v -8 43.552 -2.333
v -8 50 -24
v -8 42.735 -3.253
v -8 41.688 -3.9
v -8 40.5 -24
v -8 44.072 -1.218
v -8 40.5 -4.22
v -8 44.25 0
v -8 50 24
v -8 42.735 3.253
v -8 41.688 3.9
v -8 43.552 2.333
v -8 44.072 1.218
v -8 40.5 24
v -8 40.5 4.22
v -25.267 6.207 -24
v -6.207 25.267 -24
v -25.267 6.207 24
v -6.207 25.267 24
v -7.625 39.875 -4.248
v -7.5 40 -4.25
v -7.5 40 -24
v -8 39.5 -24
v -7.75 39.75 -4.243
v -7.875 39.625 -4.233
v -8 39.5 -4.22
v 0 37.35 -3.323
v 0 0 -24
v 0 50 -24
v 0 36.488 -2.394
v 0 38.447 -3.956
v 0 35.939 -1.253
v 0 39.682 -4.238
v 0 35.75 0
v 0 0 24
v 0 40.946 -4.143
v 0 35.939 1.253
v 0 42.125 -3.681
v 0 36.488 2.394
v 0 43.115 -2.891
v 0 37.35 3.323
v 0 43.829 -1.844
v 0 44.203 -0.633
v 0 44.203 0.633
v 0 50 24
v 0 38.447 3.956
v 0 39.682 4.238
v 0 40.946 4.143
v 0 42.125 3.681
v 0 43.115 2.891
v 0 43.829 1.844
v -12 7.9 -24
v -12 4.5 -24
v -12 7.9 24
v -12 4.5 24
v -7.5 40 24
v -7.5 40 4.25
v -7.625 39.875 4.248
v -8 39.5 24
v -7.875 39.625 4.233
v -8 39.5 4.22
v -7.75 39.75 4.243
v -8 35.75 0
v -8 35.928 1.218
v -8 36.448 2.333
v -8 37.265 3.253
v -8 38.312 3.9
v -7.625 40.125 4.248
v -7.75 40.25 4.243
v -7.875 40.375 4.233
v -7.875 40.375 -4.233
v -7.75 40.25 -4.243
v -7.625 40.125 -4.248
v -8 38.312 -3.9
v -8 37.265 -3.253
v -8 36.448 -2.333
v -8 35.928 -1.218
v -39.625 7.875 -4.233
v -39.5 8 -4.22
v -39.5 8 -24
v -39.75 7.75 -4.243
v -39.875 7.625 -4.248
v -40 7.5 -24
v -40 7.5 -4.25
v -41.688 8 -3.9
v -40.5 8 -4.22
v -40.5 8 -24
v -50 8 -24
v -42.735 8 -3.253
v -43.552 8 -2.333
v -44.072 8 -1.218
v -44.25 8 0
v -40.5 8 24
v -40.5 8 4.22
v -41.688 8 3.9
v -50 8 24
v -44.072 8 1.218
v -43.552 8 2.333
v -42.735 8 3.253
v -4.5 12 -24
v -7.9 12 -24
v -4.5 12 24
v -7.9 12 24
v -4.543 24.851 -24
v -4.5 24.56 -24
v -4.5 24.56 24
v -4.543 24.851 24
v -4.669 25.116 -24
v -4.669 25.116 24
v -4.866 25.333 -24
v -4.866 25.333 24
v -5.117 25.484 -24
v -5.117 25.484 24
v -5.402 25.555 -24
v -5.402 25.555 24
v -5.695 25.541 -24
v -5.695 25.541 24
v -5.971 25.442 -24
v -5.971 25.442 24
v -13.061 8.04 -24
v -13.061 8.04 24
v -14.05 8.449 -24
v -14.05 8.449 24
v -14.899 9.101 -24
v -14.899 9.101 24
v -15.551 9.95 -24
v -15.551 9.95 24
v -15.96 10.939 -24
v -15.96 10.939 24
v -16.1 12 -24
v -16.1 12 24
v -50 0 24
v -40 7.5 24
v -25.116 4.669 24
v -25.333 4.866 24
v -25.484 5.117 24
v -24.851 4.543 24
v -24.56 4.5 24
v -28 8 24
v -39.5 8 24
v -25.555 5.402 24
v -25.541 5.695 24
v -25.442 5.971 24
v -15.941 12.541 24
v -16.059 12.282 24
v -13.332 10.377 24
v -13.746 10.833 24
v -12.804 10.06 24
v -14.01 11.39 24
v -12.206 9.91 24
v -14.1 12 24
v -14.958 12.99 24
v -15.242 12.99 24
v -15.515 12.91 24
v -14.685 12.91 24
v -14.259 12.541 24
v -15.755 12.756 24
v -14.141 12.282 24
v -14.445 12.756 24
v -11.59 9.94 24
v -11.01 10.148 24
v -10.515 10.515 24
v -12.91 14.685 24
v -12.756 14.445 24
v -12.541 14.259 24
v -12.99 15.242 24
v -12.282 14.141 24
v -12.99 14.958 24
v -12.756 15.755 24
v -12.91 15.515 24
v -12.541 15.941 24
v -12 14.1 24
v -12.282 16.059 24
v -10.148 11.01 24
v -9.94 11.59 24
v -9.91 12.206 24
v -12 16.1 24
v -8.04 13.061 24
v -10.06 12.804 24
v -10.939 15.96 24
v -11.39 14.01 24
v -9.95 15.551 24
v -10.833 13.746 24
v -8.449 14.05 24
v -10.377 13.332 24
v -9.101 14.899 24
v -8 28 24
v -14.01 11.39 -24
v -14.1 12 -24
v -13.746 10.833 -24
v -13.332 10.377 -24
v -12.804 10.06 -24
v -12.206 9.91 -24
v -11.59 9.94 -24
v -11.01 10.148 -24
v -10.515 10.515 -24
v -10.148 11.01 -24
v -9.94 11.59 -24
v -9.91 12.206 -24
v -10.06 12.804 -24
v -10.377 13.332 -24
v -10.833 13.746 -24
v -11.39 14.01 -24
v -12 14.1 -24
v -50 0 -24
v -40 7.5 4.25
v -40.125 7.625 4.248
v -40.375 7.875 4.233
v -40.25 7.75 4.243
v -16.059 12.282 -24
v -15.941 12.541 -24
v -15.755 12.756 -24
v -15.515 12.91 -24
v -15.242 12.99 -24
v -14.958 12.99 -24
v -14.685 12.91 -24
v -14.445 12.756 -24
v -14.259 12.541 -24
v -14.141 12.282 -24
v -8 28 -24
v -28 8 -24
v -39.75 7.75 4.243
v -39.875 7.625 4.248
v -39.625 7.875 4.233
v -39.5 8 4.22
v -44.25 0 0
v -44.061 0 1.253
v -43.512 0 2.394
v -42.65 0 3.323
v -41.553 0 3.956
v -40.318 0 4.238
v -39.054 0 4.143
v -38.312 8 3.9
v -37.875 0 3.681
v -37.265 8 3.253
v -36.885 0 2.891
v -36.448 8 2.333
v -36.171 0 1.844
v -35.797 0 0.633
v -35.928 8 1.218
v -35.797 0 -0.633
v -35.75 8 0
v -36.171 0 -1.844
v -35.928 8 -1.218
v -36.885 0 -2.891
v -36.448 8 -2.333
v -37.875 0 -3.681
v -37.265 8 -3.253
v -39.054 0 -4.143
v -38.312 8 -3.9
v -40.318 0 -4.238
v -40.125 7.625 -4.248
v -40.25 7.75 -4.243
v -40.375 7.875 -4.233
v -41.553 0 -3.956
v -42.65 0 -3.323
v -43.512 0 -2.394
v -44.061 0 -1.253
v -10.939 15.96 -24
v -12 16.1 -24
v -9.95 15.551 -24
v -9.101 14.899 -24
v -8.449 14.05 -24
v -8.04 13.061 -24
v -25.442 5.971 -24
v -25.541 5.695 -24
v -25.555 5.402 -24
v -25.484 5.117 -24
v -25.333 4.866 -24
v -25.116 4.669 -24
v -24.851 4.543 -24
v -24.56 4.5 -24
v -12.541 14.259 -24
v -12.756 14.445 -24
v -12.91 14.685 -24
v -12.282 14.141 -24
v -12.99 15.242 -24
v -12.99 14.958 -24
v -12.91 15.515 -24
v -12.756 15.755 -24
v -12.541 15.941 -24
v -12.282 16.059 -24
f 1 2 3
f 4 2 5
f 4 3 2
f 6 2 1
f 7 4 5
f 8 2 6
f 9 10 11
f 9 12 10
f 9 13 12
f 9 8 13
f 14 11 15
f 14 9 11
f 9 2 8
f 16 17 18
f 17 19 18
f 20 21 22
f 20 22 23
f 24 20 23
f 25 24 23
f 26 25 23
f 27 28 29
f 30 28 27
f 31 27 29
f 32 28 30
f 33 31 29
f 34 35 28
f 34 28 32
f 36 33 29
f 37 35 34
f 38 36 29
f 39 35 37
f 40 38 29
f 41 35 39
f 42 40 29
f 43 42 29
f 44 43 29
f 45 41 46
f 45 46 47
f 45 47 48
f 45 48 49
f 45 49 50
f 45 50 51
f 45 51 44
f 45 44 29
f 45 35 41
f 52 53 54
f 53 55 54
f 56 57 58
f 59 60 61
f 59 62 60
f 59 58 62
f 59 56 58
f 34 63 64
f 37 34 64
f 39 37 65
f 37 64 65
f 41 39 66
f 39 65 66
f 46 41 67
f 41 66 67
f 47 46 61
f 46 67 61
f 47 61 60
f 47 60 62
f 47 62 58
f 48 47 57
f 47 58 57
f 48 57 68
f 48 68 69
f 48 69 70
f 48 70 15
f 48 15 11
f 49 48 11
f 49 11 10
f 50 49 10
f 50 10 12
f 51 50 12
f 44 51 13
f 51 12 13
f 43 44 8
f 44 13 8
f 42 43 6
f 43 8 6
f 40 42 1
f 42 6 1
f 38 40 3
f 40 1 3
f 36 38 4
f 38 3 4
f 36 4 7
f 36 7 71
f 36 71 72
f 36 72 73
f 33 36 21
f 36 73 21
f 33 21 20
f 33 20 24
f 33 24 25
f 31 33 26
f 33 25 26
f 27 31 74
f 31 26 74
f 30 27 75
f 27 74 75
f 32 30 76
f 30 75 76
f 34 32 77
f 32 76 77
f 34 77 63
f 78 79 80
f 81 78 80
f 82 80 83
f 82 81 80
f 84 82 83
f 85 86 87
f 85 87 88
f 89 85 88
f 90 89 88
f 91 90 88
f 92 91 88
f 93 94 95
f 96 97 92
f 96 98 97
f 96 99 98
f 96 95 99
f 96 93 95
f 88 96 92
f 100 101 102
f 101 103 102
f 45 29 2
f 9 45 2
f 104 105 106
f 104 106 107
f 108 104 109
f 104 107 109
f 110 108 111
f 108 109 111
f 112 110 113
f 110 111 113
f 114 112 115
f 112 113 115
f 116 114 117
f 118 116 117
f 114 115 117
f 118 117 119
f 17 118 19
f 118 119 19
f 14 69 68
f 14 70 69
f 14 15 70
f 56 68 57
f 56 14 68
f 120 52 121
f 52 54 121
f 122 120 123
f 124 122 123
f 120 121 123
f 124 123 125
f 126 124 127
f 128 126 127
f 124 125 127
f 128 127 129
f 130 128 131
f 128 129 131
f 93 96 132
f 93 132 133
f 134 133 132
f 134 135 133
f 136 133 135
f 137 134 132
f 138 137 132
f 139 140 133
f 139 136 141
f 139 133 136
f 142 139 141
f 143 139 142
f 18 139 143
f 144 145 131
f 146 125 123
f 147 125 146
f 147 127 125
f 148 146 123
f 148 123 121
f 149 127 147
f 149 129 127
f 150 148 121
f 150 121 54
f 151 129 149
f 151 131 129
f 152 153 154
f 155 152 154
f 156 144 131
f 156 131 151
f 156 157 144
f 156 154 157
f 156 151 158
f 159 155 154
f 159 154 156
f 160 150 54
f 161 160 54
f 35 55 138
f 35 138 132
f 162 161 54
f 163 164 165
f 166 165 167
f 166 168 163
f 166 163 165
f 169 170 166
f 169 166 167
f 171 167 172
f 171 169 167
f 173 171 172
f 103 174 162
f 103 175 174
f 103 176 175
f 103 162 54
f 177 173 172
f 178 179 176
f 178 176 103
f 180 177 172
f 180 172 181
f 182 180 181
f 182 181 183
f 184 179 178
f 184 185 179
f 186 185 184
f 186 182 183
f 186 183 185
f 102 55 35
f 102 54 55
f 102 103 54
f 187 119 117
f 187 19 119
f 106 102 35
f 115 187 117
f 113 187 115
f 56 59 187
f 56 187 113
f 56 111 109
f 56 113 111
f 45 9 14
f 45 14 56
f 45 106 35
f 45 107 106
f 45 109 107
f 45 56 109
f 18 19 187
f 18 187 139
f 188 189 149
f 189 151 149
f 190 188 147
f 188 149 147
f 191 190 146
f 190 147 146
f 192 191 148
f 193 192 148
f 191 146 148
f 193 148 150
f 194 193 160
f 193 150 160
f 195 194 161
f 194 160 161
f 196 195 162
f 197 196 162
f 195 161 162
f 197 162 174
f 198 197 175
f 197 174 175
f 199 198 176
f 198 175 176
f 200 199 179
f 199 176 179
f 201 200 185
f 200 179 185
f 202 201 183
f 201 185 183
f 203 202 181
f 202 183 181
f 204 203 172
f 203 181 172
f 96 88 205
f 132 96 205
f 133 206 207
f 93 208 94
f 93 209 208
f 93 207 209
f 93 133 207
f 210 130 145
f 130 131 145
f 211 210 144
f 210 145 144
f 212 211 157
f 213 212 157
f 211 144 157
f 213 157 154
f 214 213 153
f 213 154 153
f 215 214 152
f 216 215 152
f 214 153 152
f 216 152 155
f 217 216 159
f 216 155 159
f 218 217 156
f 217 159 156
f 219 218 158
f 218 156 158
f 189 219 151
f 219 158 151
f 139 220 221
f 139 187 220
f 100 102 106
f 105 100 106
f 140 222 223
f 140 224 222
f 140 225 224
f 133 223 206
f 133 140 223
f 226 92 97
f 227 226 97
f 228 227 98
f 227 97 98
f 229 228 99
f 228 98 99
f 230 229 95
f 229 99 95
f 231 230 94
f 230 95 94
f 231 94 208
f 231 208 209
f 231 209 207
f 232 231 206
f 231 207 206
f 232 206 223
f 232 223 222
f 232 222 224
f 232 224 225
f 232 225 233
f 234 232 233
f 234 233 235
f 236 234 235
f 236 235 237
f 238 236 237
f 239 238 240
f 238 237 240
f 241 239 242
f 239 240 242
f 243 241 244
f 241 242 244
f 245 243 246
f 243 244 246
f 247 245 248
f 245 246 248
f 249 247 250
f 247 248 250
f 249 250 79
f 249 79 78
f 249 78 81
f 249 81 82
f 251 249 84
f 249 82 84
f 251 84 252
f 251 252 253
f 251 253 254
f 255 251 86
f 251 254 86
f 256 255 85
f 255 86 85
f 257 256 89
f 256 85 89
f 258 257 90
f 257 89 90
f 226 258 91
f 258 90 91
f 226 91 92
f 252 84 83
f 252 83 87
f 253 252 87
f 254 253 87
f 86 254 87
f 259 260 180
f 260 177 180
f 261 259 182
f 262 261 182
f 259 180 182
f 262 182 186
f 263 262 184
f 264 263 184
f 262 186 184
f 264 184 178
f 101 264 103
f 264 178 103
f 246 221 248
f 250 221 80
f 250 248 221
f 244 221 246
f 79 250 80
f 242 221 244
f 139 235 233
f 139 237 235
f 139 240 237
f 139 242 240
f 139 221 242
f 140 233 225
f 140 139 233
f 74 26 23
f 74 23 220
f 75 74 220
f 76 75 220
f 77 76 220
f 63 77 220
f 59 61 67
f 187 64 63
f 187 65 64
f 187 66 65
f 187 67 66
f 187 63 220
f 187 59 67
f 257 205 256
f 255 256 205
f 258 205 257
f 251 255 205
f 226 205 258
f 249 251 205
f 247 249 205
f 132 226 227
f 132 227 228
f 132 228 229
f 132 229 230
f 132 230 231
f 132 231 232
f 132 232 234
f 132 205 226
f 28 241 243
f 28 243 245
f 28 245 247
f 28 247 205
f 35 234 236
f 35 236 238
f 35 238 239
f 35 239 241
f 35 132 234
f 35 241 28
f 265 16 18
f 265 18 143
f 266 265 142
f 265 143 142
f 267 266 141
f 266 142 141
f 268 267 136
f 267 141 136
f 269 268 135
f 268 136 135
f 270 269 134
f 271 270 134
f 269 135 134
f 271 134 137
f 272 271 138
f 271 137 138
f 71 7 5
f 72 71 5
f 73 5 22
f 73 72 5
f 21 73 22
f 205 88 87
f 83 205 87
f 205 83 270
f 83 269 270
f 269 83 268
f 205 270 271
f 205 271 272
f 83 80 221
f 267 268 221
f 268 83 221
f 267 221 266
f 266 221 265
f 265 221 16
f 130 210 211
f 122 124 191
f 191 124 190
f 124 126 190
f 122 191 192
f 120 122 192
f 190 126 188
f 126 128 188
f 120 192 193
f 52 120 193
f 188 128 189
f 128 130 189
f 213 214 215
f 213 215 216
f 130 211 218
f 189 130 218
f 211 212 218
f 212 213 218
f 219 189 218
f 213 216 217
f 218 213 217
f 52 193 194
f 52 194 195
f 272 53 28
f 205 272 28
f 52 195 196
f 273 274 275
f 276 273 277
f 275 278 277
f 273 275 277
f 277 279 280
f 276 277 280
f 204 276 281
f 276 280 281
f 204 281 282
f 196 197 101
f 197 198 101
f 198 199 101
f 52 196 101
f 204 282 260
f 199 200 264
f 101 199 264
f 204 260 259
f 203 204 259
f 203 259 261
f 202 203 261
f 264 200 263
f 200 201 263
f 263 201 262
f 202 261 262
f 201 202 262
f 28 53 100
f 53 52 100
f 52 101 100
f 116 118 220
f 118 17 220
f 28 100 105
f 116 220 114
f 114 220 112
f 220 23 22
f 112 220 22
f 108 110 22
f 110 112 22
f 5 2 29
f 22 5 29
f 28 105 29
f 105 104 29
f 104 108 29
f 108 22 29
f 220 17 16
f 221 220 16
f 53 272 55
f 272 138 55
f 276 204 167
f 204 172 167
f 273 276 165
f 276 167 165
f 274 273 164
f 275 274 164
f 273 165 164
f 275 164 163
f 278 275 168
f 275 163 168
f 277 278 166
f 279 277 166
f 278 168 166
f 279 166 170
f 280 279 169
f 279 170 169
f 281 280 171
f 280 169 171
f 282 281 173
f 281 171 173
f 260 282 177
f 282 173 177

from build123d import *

# Parameters (mm, degrees)
EXTRUDE_1_DEPTH     = 24
SKETCH_2_R          = 4.25
CUT_EXTRUDE_1_DEPTH = 9
SKETCH_3_R          = 4.25
CUT_EXTRUDE_2_DEPTH = 9


with BuildPart() as part:
    # Эскиз1 → Бобышка-Вытянуть1 (new body, symmetric)
    with BuildSketch(Plane.XY):
        Polygon((-50, 0), (0, 0), (0, 50), (-8, 50), (-8, 40.5), (-7.5, 40), (-8, 39.5), (-8, 28), (-28, 8), (-39.5, 8), (-40, 7.5), (-40.5, 8), (-50, 8), align=None)
        with BuildLine():
            Line((-4.5, 12), (-4.5, 24.560303038))
            ThreePointArc((-4.5, 24.560303038), (-5.117316568, 25.484182571), (-6.207106781, 25.267409819))
            Line((-6.207106781, 25.267409819), (-25.267409819, 6.207106781))
            ThreePointArc((-25.267409819, 6.207106781), (-25.484182571, 5.117316568), (-24.560303038, 4.5))
            Line((-24.560303038, 4.5), (-12, 4.5))
            Line((-12, 4.5), (-12, 7.9))
            ThreePointArc((-12, 7.9), (-14.899137803, 9.100862197), (-16.1, 12))
            ThreePointArc((-16.1, 12), (-15.1, 13), (-14.1, 12))
            ThreePointArc((-14.1, 12), (-10.51507576, 10.51507576), (-12, 14.1))
            ThreePointArc((-12, 14.1), (-13, 15.1), (-12, 16.1))
            ThreePointArc((-12, 16.1), (-9.100862197, 14.899137803), (-7.9, 12))
            Line((-7.9, 12), (-4.5, 12))
        make_face(mode=Mode.SUBTRACT)
    extrude(amount=EXTRUDE_1_DEPTH, both=True)

    # Эскиз2 → Вырез-Вытянуть1 (cut, through all)
    with BuildSketch(Plane.ZY.offset(8)):
        with Locations(Location((0, 40, 0), (0, 0, 270))):  # turned: the seam where the file's is
            Circle(SKETCH_2_R)
    extrude(amount=-CUT_EXTRUDE_1_DEPTH, mode=Mode.SUBTRACT)

    # Эскиз3 → Вырез-Вытянуть2 (cut, through all)
    with BuildSketch(Plane(origin=(0, 8, 0), x_dir=(1, 0, 0), z_dir=(0, 1, 0))):
        with Locations(Location((-40, 0, 0), (0, 0, 180))):  # turned: the seam where the file's is
            Circle(SKETCH_3_R)
    extrude(amount=-CUT_EXTRUDE_2_DEPTH, mode=Mode.SUBTRACT)


solid = part.part
